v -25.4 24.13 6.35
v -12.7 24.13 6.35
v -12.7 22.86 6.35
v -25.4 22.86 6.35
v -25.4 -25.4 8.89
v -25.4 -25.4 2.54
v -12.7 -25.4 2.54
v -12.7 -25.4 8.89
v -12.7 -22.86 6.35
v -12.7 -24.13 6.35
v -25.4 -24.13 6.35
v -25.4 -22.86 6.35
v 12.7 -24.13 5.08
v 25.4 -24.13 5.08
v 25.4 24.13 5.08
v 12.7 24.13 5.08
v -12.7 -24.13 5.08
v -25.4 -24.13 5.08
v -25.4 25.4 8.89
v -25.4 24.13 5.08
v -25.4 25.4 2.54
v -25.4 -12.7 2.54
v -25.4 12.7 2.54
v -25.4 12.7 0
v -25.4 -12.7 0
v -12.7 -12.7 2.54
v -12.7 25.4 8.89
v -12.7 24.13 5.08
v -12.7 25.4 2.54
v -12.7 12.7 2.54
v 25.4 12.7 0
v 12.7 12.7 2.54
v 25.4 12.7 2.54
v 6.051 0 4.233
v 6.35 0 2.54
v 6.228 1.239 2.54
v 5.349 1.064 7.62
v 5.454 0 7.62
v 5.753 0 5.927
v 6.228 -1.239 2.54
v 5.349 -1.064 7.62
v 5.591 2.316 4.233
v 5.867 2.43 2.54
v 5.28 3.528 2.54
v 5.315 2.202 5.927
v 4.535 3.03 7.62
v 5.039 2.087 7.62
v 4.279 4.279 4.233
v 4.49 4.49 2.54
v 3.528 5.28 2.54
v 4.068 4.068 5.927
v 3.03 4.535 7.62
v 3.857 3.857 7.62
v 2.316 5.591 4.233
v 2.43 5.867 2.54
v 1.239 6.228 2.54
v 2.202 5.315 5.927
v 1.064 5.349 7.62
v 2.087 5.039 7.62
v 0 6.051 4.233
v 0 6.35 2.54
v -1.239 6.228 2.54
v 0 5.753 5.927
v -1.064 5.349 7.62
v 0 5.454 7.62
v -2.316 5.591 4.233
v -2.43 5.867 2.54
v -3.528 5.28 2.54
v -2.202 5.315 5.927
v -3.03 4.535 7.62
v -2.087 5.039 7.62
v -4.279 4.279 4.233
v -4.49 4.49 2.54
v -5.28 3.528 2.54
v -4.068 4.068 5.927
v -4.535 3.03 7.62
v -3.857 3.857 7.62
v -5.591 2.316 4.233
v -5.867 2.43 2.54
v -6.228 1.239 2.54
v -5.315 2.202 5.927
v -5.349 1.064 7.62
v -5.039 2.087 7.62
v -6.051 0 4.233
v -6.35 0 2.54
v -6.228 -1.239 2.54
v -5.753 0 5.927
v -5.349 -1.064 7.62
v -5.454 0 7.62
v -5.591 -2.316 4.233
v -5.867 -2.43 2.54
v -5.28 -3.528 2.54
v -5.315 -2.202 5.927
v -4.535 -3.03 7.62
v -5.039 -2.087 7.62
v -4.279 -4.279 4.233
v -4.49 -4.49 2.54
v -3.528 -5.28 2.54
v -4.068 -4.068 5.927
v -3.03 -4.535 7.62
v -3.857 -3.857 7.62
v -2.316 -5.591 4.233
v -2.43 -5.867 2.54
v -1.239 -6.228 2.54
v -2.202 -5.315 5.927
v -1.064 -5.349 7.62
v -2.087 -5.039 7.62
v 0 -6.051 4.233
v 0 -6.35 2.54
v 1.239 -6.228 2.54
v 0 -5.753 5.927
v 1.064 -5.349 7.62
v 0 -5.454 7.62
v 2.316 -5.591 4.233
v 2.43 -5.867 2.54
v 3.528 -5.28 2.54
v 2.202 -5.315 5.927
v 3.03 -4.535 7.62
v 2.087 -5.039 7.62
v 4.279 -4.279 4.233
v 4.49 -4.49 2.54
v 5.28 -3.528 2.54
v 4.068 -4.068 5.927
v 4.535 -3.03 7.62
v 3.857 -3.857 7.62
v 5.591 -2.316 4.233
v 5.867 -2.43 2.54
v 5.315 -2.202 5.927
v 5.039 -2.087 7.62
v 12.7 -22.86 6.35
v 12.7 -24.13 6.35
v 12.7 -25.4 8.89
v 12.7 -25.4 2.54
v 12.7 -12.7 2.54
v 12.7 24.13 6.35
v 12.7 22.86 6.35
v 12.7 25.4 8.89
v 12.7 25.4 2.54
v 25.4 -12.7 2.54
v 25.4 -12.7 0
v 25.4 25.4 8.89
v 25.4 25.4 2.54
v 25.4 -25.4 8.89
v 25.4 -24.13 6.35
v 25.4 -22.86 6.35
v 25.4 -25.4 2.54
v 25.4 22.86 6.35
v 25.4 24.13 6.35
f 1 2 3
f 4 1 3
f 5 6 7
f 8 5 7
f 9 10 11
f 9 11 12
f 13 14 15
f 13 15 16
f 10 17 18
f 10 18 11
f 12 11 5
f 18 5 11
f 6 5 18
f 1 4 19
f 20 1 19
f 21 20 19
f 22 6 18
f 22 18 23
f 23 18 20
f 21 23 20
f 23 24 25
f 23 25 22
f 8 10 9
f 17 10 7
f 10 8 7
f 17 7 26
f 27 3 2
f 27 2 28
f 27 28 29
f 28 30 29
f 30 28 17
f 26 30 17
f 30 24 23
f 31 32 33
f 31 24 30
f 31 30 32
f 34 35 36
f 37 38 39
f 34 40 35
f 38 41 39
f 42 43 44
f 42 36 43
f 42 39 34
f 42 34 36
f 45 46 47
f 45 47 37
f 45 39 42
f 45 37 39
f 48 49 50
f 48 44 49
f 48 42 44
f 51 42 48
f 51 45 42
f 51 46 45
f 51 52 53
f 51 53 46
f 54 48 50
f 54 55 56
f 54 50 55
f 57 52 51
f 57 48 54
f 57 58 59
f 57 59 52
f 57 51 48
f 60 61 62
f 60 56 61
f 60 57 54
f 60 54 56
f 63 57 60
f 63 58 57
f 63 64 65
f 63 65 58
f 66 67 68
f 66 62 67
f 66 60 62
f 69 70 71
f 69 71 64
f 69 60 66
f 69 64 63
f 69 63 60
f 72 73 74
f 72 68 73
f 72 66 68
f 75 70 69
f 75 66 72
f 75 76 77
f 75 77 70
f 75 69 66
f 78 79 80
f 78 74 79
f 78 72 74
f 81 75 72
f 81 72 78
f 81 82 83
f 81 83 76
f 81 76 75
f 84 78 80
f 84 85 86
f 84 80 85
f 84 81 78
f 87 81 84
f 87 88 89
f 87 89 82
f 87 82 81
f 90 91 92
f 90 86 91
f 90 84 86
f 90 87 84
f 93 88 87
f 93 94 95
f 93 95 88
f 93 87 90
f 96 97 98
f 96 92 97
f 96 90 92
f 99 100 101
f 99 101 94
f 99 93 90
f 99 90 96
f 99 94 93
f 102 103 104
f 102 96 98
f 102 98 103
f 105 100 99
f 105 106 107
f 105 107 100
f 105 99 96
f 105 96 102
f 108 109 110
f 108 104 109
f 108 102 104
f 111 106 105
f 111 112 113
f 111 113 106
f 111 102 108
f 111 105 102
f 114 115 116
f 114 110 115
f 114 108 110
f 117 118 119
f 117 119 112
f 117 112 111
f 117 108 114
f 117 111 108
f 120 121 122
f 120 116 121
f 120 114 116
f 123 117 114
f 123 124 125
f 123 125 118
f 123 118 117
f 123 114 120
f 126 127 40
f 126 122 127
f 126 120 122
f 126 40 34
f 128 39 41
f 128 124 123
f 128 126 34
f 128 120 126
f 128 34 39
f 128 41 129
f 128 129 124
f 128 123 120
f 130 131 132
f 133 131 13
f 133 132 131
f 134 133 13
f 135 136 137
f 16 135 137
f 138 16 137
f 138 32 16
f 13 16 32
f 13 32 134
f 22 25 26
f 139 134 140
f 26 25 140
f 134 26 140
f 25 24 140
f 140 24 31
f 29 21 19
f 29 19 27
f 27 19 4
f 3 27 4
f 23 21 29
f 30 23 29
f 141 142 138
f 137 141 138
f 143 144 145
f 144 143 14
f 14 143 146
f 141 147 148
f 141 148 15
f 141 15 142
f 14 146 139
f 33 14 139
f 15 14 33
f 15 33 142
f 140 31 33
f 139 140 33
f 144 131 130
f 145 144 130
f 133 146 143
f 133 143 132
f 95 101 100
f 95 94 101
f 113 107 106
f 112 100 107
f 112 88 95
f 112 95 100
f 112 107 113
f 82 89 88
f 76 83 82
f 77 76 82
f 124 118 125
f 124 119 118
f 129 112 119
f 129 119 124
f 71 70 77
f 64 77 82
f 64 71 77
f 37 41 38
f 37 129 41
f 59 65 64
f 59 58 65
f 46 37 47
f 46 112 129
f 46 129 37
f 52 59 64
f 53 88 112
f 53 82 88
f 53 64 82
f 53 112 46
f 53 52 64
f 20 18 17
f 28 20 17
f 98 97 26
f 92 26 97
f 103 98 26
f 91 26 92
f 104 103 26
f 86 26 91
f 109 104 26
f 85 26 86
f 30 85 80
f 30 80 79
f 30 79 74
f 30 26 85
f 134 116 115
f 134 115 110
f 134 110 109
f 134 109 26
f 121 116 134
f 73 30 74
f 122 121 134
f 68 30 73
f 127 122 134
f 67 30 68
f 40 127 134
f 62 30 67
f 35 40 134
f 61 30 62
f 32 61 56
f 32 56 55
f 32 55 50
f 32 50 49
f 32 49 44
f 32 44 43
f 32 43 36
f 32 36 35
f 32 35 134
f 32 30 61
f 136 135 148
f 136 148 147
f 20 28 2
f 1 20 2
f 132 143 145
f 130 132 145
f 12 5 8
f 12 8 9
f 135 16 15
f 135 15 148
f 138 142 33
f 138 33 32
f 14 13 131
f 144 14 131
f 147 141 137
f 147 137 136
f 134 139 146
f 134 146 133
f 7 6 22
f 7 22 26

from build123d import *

# Parameters (mm, degrees)
F0_W      = 50.8
F0_H      = 25.4
F1_DEPTH  = 2.54
F2_W      = 12.7
F2_H      = 50.8
F3_DEPTH  = 2.54
F4_W      = 12.7
F4_H      = 2.54
F5_DEPTH  = 3.81
F6_W      = 1.27
F6_H      = 1.27
F7_DEPTH  = 25.4
F10_R     = 6.35
F11_DEPTH = 5.08
F11_TAPER = 10


with BuildPart() as f1:
    # F0 (on Top) → F1 (new body)
    with BuildSketch(Plane.XY):
        Rectangle(F0_W, F0_H)
    extrude(amount=F1_DEPTH)

    # F2 (on face) → F3 (join)
    with BuildSketch(Plane.XY.offset(2.54)):
        with Locations((-19.05, 0)):
            Rectangle(F2_W, F2_H)
    extrude(amount=F3_DEPTH)

    # F4 (on face) → F5 (join)
    with BuildSketch(Plane.XY.offset(5.08)):
        with Locations((-19.05, 24.13)):
            Rectangle(F4_W, F4_H)
    extrude(amount=F5_DEPTH)

    # F6 (on face) → F7 (cut)
    with BuildSketch(Plane(origin=(-25.4, 0, 0), x_dir=(0, -1, 0), z_dir=(-1, 0, 0))):
        Polygon((-22.86, 8.89), (-25.4, 8.89), (-22.86, 6.35), align=None)
        with Locations((-23.495, 5.715)):
            Rectangle(F6_W, F6_H)
    extrude(amount=-F7_DEPTH, mode=Mode.SUBTRACT)


with BuildPart() as f8_1:
    # F8: instance of F1
    add(f1.part.mirror(Plane.XZ))


with BuildPart() as f9_1:
    # F9: instance of F1
    add(f1.part.mirror(Plane.YZ))


with BuildPart() as f9_2:
    # F9: instance of F8_1
    add(f8_1.part.mirror(Plane.YZ))


with BuildPart() as f1_1:
    add(f1.part)

    add(f8_1.part)  # F11 merges F8_1

    add(f9_1.part)  # F11 merges F9_1

    add(f9_2.part)  # F11 merges F9_2
    # F10 (on face) → F11 (join)
    with BuildSketch(Plane.XY.offset(2.54)):
        Circle(F10_R)
    extrude(amount=F11_DEPTH, taper=F11_TAPER)


solid = f1_1.part
